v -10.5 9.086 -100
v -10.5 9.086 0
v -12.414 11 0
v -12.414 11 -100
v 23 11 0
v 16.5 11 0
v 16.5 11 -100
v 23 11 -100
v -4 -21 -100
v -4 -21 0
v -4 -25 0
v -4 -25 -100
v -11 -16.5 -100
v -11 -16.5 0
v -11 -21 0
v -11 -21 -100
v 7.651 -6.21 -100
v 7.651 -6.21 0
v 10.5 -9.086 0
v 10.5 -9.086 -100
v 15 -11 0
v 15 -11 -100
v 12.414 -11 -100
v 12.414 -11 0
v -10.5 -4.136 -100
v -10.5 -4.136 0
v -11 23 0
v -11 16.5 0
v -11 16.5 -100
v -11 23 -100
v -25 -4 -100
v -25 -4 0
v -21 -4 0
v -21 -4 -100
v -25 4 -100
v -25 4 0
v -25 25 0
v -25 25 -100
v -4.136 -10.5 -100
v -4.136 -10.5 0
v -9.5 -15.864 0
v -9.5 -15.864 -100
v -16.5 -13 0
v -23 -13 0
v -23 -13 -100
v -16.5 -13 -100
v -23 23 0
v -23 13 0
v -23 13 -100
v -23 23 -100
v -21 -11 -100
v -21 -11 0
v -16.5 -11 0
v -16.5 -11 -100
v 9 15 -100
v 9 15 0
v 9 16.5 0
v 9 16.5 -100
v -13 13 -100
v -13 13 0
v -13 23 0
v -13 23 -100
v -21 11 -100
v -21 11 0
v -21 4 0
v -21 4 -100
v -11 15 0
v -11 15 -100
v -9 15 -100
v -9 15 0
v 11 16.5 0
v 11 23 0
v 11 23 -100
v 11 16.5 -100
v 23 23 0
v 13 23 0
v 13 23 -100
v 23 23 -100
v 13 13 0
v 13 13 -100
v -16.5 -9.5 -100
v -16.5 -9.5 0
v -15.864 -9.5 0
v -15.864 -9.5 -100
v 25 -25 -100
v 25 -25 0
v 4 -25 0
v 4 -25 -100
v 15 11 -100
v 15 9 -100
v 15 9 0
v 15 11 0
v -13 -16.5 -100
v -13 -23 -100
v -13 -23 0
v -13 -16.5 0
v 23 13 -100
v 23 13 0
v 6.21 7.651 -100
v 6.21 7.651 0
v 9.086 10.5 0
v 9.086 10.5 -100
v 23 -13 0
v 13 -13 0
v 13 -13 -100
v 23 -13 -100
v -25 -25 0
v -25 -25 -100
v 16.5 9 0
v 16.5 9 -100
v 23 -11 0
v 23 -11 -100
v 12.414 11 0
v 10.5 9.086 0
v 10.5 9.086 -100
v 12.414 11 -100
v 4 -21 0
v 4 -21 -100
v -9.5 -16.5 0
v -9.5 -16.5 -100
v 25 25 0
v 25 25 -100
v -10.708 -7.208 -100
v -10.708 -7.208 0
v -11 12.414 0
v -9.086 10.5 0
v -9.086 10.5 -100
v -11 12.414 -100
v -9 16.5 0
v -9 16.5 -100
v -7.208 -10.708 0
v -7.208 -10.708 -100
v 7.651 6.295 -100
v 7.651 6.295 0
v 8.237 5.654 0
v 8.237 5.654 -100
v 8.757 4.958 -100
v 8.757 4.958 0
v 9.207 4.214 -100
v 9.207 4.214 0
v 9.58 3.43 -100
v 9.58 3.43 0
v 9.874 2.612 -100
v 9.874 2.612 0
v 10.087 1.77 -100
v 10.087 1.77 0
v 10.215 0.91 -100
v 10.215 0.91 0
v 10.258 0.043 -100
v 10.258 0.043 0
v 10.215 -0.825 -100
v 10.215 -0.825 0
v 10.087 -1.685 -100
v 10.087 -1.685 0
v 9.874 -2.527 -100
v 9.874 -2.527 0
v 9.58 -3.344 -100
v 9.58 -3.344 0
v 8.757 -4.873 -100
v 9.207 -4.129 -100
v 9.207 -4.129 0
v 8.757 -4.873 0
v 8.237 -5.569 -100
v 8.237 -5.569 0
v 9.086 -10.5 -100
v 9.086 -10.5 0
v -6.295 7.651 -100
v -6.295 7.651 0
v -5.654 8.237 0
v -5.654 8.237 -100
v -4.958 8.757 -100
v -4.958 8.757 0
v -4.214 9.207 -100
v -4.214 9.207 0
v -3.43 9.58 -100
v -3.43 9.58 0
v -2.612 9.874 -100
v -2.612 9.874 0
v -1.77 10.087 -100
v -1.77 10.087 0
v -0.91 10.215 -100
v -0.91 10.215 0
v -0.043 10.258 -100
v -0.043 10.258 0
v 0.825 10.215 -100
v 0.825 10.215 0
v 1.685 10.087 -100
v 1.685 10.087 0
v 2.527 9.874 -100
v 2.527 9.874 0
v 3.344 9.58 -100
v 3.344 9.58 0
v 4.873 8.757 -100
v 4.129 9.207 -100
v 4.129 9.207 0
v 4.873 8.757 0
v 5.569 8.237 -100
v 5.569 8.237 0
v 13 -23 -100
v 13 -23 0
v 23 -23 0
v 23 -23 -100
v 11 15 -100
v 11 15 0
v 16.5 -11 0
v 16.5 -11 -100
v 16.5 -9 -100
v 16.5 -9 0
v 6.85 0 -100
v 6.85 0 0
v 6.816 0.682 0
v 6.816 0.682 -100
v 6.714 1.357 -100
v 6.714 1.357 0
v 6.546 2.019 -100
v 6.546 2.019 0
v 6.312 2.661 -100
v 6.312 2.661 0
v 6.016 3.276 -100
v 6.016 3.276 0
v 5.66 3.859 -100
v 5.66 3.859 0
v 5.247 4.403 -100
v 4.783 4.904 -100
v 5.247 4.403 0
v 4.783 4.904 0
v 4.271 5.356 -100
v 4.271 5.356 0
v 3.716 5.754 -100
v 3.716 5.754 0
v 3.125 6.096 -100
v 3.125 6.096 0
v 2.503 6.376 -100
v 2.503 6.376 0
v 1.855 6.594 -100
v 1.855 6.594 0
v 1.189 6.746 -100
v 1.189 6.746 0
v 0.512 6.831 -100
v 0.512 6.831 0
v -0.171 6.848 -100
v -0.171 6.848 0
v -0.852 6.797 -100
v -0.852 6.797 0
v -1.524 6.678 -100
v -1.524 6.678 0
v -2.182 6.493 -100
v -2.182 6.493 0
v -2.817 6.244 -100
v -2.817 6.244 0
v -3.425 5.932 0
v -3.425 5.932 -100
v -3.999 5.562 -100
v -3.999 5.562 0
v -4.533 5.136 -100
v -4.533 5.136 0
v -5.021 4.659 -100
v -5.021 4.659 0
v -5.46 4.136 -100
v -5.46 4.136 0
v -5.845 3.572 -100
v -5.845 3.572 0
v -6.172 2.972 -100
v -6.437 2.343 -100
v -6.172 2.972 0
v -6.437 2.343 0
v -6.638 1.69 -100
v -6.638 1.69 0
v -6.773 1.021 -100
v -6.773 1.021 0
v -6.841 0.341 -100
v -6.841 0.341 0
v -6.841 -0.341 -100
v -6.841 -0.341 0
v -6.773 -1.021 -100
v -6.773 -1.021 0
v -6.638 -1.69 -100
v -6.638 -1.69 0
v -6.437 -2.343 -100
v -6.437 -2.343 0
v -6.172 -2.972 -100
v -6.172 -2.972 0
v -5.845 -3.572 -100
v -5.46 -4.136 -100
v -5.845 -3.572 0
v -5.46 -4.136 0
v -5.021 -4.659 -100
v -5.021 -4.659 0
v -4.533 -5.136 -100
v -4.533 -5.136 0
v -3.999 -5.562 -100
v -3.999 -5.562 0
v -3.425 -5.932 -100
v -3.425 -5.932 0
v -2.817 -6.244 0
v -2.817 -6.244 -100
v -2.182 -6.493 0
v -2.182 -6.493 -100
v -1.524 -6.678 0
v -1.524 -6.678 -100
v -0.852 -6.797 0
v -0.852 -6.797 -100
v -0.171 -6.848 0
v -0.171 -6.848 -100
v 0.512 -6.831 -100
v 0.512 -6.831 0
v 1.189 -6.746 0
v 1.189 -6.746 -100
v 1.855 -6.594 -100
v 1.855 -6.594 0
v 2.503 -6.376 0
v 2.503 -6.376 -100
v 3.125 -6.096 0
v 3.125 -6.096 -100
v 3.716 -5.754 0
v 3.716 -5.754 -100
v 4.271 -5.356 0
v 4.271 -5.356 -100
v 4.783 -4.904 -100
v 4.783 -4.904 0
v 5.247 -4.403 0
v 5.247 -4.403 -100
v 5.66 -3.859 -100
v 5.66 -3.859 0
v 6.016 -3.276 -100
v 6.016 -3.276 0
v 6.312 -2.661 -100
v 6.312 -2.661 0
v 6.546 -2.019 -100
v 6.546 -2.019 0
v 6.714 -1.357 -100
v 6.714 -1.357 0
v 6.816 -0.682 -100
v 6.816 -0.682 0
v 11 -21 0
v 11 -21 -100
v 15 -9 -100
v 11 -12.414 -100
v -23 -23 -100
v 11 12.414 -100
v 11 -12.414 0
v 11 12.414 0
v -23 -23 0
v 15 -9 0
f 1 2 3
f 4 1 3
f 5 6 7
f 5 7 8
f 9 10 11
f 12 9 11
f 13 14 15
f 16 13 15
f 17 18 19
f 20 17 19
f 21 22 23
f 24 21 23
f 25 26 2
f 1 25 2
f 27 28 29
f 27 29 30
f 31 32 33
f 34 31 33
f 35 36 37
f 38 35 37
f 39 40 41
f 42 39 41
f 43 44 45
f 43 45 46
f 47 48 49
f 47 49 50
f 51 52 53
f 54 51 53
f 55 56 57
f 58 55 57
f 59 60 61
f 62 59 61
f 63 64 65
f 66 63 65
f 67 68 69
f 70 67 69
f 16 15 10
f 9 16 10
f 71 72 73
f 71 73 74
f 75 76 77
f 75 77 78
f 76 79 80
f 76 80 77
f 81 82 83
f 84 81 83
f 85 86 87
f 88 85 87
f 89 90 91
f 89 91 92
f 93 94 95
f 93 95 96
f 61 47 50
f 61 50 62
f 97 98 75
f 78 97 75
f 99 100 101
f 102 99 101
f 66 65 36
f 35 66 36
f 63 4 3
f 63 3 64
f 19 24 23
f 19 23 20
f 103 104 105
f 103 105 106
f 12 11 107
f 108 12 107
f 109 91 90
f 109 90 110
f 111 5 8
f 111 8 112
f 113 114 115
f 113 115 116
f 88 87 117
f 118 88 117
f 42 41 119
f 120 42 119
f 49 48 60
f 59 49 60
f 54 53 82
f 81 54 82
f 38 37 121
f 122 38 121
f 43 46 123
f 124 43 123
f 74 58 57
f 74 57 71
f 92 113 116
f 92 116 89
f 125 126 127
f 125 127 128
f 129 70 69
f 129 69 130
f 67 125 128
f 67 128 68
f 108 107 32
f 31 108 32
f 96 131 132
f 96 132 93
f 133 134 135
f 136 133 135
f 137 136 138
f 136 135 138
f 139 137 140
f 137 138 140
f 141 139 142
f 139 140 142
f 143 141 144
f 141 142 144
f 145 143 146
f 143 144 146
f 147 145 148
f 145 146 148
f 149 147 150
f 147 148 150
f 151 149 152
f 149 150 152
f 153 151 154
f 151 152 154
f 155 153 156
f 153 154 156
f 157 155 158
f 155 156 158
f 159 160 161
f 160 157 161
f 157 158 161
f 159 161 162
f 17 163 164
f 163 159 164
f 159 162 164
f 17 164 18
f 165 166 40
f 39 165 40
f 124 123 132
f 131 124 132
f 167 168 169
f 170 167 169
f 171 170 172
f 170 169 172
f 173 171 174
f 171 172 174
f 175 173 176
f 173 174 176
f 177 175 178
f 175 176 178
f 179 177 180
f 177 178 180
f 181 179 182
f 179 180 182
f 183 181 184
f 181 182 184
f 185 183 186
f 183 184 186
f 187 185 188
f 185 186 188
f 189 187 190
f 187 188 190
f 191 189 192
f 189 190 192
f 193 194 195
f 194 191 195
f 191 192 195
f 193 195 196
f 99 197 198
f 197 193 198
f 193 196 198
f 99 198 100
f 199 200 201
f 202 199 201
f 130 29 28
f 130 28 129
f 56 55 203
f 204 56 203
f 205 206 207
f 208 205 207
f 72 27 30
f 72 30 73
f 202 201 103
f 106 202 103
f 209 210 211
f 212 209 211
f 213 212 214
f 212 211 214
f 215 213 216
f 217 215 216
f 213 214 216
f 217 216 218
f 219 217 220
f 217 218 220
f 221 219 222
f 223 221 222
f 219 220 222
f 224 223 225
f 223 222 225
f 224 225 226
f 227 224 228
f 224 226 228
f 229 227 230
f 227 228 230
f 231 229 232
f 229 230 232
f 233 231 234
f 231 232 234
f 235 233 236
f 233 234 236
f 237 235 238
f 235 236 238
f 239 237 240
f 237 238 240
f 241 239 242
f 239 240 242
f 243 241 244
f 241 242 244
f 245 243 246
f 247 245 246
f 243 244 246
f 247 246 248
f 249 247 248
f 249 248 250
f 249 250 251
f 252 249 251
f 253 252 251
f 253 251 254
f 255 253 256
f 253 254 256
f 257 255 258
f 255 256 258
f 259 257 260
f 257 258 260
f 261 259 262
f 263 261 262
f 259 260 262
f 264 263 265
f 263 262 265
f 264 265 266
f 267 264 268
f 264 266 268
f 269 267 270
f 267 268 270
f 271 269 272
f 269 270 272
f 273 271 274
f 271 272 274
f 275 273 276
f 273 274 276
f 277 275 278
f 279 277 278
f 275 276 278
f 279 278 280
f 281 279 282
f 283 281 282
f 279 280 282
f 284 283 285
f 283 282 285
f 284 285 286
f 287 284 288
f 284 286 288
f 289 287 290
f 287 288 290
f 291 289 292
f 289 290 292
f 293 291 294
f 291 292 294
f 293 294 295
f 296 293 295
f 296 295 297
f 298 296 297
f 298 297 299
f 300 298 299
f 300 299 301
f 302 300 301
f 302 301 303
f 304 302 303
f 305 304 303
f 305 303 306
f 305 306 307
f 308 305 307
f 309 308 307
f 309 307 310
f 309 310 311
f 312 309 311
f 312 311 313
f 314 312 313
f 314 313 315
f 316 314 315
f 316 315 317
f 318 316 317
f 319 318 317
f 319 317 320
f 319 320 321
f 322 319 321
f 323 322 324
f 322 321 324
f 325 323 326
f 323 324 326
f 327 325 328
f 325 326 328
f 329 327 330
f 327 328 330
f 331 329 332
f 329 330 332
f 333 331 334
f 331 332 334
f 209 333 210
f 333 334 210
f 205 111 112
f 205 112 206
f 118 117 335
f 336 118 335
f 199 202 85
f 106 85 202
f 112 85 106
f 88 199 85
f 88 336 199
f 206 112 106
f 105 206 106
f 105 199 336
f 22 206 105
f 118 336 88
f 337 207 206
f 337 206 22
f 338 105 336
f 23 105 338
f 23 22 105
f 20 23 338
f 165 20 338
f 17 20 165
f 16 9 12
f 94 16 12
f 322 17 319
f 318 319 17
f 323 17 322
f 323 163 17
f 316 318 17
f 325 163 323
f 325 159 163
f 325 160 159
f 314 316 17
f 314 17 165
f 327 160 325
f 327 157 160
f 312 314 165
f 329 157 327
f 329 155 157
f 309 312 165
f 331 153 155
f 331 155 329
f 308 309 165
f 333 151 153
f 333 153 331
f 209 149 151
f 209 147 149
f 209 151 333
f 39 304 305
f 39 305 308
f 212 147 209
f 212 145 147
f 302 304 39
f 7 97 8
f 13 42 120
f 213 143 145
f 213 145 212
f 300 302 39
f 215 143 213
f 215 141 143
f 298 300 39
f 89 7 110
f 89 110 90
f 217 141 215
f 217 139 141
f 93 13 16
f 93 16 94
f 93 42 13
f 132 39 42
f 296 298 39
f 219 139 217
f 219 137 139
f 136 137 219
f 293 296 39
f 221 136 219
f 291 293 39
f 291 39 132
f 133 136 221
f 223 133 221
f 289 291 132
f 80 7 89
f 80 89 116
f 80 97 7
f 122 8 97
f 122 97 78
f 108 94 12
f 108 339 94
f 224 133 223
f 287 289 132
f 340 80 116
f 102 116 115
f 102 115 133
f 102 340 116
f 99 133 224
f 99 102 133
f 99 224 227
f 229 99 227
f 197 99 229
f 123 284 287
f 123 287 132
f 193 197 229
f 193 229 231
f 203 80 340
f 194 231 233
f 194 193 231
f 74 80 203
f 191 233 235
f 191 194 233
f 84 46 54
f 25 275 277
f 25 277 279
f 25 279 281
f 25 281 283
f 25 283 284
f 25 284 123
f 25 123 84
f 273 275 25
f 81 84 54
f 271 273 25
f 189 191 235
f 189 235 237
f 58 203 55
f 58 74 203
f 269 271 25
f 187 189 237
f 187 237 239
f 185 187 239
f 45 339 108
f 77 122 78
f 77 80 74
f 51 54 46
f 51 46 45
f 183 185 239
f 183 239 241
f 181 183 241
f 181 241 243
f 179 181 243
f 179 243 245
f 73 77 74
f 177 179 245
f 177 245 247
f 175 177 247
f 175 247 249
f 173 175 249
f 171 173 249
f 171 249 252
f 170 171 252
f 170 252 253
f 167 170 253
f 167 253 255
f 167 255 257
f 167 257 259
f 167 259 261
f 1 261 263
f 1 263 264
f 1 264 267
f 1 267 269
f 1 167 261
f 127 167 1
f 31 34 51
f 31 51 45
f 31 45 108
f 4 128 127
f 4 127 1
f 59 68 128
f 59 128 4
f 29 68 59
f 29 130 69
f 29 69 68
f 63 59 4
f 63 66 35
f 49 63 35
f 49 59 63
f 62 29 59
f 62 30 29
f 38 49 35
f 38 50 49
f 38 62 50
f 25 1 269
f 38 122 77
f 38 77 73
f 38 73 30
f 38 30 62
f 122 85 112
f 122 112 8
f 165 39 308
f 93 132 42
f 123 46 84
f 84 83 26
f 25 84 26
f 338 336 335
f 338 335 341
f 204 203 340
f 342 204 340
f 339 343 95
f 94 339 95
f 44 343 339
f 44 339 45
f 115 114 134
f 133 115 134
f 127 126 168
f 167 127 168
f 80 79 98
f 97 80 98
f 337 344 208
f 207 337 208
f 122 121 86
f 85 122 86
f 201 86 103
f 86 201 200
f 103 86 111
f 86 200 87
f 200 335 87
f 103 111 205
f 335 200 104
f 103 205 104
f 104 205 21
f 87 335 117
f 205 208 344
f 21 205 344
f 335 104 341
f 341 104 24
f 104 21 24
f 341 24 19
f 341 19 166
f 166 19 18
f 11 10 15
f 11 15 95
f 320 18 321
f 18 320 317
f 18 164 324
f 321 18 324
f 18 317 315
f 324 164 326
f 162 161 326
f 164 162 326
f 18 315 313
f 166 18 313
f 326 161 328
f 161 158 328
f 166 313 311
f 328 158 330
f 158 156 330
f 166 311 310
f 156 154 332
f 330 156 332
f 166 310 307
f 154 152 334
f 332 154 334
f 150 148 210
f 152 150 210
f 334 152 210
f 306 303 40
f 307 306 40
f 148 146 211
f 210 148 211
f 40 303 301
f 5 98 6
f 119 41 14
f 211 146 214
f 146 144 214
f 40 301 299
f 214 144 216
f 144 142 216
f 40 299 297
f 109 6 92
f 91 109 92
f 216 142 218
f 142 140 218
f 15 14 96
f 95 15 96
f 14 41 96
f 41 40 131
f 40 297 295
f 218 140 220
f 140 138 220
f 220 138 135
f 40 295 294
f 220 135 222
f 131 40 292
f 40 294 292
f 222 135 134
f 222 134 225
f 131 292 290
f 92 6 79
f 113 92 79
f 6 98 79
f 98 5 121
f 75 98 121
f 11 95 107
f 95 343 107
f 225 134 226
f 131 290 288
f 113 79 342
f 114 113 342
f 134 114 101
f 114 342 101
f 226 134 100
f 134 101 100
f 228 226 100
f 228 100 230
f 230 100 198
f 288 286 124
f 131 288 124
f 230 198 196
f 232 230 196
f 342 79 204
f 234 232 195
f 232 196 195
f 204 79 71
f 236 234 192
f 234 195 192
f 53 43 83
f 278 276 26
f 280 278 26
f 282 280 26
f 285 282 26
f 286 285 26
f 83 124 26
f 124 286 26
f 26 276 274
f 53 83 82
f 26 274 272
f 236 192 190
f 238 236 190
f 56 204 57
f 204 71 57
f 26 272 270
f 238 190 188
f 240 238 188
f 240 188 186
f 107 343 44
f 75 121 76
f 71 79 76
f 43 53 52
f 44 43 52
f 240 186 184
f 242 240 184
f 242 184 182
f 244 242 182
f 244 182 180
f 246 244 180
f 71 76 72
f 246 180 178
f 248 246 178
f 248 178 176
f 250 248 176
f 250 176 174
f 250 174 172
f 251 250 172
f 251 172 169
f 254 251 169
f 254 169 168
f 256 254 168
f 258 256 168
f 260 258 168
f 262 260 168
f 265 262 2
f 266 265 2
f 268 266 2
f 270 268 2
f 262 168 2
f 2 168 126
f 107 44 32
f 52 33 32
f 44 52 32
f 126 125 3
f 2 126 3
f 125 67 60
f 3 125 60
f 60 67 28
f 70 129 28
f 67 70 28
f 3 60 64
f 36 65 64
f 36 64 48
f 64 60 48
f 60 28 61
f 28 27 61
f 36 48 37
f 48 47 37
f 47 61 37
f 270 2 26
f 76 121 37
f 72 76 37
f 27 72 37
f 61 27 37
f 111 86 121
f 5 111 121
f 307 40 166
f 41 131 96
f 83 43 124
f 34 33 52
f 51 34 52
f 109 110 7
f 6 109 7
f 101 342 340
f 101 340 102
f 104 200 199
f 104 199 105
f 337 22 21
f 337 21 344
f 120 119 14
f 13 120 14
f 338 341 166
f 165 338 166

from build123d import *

# Parameters (mm, degrees)
SKETCH_A01_7_R     = 6.85
SKETCH_A01_7_W     = 10
SKETCH_A01_7_H     = 10
EXTRUDE1_DEPTH     = 100
CUT_EXTRUDE1_DEPTH = 101
CUT_EXTRUDE2_DEPTH = 101
CIRPATTERN2_COUNT  = 2
CIRPATTERN2_ANGLE  = 270
SKETCH3_W          = 2
SKETCH3_H          = 1.5
EXTRUDE3_DEPTH     = 100
SKETCH4_W          = 1.5
SKETCH4_H          = 2
EXTRUDE4_DEPTH     = 100


with BuildPart() as part:
    # Sketch A01-7 → Extrude1 (new body)
    with BuildSketch(Plane.XY):
        Polygon((-16.5, -11), (-16.5, -9.5), (-15.863959988, -9.5), (-10.5, -4.136038954), (-10.5, 9.085786), (-12.414214, 11), (-21, 11), (-21, 4), (-25, 4), (-25, 25), (25, 25), (25, -25), (4, -25), (4, -21), (11, -21), (11, -12.414214), (9.085786, -10.5), (-4.136039046, -10.5), (-9.5, -15.863962012), (-9.5, -16.5), (-11, -16.5), (-11, -21), (-4, -21), (-4, -25), (-25, -25), (-25, -4), (-21, -4), (-21, -11), align=None)
        Circle(SKETCH_A01_7_R, mode=Mode.SUBTRACT)
        Polygon((12.414213, -11), (10.500000477, -9.085787477), (10.500000477, 9.085786477), (12.414214, 11), (23, 11), (23, -11), align=None, mode=Mode.SUBTRACT)
        Polygon((11, 12.414213), (9.085787477, 10.500000477), (-9.085786477, 10.500000477), (-11, 12.414214), (-11, 23), (11, 23), align=None, mode=Mode.SUBTRACT)
        with Locations((-18, -18)):
            Rectangle(SKETCH_A01_7_W, SKETCH_A01_7_H, mode=Mode.SUBTRACT)
        with Locations((18, -18)):
            Rectangle(SKETCH_A01_7_W, SKETCH_A01_7_H, mode=Mode.SUBTRACT)
        with Locations((-18, 18)):
            Rectangle(SKETCH_A01_7_W, SKETCH_A01_7_H, mode=Mode.SUBTRACT)
        with Locations((18, 18)):
            Rectangle(SKETCH_A01_7_W, SKETCH_A01_7_H, mode=Mode.SUBTRACT)
    extrude(amount=-EXTRUDE1_DEPTH)

    # Sketch1 → Cut-Extrude1 (cut, through all)
    with BuildSketch(Plane.XY):
        Polygon((-16.5, -13), (-10.707726017, -7.207724875), (-7.207726017, -10.707724185), (-13, -16.49999931), align=None)
    extrude(amount=-CUT_EXTRUDE1_DEPTH, mode=Mode.SUBTRACT)

    # Sketch2 → Cut-Extrude2 (cut, through all)
    with BuildSketch(Plane.XY):
        with BuildLine():
            Line((-9.085786477, 10.500000477), (-6.294899419, 7.650918733))
            ThreePointArc((-6.294899419, 7.650918733), (-0.042574105, 10.257977016), (6.209751208, 7.650918733))
            Line((6.209751208, 7.650918733), (9.085787477, 10.500000477))
            Line((9.085787477, 10.500000477), (-9.085786477, 10.500000477))
        make_face()
    cut_extrude2 = extrude(amount=-CUT_EXTRUDE2_DEPTH, mode=Mode.SUBTRACT)

    # CirPattern2: Cut-Extrude2 ×2 about axis
    cirpattern2_axis = Axis((0, 0, 0), (0, 0, 1))
    for i in range(1, CIRPATTERN2_COUNT):
        add(cut_extrude2.rotate(cirpattern2_axis, i * CIRPATTERN2_ANGLE / (CIRPATTERN2_COUNT - 1)), mode=Mode.SUBTRACT)

    # Sketch3 → Extrude3 (add, through all)
    with BuildSketch(Plane.XY):
        with Locations((-10, 15.75)):
            Rectangle(SKETCH3_W, SKETCH3_H)
        with Locations((10, 15.75)):
            Rectangle(SKETCH3_W, SKETCH3_H)
    extrude(amount=-EXTRUDE3_DEPTH)

    # Sketch4 → Extrude4 (add, through all)
    with BuildSketch(Plane.XY):
        with Locations((15.75, 10)):
            Rectangle(SKETCH4_W, SKETCH4_H)
        with Locations((15.75, -10)):
            Rectangle(SKETCH4_W, SKETCH4_H)
    extrude(amount=-EXTRUDE4_DEPTH)


solid = part.part
